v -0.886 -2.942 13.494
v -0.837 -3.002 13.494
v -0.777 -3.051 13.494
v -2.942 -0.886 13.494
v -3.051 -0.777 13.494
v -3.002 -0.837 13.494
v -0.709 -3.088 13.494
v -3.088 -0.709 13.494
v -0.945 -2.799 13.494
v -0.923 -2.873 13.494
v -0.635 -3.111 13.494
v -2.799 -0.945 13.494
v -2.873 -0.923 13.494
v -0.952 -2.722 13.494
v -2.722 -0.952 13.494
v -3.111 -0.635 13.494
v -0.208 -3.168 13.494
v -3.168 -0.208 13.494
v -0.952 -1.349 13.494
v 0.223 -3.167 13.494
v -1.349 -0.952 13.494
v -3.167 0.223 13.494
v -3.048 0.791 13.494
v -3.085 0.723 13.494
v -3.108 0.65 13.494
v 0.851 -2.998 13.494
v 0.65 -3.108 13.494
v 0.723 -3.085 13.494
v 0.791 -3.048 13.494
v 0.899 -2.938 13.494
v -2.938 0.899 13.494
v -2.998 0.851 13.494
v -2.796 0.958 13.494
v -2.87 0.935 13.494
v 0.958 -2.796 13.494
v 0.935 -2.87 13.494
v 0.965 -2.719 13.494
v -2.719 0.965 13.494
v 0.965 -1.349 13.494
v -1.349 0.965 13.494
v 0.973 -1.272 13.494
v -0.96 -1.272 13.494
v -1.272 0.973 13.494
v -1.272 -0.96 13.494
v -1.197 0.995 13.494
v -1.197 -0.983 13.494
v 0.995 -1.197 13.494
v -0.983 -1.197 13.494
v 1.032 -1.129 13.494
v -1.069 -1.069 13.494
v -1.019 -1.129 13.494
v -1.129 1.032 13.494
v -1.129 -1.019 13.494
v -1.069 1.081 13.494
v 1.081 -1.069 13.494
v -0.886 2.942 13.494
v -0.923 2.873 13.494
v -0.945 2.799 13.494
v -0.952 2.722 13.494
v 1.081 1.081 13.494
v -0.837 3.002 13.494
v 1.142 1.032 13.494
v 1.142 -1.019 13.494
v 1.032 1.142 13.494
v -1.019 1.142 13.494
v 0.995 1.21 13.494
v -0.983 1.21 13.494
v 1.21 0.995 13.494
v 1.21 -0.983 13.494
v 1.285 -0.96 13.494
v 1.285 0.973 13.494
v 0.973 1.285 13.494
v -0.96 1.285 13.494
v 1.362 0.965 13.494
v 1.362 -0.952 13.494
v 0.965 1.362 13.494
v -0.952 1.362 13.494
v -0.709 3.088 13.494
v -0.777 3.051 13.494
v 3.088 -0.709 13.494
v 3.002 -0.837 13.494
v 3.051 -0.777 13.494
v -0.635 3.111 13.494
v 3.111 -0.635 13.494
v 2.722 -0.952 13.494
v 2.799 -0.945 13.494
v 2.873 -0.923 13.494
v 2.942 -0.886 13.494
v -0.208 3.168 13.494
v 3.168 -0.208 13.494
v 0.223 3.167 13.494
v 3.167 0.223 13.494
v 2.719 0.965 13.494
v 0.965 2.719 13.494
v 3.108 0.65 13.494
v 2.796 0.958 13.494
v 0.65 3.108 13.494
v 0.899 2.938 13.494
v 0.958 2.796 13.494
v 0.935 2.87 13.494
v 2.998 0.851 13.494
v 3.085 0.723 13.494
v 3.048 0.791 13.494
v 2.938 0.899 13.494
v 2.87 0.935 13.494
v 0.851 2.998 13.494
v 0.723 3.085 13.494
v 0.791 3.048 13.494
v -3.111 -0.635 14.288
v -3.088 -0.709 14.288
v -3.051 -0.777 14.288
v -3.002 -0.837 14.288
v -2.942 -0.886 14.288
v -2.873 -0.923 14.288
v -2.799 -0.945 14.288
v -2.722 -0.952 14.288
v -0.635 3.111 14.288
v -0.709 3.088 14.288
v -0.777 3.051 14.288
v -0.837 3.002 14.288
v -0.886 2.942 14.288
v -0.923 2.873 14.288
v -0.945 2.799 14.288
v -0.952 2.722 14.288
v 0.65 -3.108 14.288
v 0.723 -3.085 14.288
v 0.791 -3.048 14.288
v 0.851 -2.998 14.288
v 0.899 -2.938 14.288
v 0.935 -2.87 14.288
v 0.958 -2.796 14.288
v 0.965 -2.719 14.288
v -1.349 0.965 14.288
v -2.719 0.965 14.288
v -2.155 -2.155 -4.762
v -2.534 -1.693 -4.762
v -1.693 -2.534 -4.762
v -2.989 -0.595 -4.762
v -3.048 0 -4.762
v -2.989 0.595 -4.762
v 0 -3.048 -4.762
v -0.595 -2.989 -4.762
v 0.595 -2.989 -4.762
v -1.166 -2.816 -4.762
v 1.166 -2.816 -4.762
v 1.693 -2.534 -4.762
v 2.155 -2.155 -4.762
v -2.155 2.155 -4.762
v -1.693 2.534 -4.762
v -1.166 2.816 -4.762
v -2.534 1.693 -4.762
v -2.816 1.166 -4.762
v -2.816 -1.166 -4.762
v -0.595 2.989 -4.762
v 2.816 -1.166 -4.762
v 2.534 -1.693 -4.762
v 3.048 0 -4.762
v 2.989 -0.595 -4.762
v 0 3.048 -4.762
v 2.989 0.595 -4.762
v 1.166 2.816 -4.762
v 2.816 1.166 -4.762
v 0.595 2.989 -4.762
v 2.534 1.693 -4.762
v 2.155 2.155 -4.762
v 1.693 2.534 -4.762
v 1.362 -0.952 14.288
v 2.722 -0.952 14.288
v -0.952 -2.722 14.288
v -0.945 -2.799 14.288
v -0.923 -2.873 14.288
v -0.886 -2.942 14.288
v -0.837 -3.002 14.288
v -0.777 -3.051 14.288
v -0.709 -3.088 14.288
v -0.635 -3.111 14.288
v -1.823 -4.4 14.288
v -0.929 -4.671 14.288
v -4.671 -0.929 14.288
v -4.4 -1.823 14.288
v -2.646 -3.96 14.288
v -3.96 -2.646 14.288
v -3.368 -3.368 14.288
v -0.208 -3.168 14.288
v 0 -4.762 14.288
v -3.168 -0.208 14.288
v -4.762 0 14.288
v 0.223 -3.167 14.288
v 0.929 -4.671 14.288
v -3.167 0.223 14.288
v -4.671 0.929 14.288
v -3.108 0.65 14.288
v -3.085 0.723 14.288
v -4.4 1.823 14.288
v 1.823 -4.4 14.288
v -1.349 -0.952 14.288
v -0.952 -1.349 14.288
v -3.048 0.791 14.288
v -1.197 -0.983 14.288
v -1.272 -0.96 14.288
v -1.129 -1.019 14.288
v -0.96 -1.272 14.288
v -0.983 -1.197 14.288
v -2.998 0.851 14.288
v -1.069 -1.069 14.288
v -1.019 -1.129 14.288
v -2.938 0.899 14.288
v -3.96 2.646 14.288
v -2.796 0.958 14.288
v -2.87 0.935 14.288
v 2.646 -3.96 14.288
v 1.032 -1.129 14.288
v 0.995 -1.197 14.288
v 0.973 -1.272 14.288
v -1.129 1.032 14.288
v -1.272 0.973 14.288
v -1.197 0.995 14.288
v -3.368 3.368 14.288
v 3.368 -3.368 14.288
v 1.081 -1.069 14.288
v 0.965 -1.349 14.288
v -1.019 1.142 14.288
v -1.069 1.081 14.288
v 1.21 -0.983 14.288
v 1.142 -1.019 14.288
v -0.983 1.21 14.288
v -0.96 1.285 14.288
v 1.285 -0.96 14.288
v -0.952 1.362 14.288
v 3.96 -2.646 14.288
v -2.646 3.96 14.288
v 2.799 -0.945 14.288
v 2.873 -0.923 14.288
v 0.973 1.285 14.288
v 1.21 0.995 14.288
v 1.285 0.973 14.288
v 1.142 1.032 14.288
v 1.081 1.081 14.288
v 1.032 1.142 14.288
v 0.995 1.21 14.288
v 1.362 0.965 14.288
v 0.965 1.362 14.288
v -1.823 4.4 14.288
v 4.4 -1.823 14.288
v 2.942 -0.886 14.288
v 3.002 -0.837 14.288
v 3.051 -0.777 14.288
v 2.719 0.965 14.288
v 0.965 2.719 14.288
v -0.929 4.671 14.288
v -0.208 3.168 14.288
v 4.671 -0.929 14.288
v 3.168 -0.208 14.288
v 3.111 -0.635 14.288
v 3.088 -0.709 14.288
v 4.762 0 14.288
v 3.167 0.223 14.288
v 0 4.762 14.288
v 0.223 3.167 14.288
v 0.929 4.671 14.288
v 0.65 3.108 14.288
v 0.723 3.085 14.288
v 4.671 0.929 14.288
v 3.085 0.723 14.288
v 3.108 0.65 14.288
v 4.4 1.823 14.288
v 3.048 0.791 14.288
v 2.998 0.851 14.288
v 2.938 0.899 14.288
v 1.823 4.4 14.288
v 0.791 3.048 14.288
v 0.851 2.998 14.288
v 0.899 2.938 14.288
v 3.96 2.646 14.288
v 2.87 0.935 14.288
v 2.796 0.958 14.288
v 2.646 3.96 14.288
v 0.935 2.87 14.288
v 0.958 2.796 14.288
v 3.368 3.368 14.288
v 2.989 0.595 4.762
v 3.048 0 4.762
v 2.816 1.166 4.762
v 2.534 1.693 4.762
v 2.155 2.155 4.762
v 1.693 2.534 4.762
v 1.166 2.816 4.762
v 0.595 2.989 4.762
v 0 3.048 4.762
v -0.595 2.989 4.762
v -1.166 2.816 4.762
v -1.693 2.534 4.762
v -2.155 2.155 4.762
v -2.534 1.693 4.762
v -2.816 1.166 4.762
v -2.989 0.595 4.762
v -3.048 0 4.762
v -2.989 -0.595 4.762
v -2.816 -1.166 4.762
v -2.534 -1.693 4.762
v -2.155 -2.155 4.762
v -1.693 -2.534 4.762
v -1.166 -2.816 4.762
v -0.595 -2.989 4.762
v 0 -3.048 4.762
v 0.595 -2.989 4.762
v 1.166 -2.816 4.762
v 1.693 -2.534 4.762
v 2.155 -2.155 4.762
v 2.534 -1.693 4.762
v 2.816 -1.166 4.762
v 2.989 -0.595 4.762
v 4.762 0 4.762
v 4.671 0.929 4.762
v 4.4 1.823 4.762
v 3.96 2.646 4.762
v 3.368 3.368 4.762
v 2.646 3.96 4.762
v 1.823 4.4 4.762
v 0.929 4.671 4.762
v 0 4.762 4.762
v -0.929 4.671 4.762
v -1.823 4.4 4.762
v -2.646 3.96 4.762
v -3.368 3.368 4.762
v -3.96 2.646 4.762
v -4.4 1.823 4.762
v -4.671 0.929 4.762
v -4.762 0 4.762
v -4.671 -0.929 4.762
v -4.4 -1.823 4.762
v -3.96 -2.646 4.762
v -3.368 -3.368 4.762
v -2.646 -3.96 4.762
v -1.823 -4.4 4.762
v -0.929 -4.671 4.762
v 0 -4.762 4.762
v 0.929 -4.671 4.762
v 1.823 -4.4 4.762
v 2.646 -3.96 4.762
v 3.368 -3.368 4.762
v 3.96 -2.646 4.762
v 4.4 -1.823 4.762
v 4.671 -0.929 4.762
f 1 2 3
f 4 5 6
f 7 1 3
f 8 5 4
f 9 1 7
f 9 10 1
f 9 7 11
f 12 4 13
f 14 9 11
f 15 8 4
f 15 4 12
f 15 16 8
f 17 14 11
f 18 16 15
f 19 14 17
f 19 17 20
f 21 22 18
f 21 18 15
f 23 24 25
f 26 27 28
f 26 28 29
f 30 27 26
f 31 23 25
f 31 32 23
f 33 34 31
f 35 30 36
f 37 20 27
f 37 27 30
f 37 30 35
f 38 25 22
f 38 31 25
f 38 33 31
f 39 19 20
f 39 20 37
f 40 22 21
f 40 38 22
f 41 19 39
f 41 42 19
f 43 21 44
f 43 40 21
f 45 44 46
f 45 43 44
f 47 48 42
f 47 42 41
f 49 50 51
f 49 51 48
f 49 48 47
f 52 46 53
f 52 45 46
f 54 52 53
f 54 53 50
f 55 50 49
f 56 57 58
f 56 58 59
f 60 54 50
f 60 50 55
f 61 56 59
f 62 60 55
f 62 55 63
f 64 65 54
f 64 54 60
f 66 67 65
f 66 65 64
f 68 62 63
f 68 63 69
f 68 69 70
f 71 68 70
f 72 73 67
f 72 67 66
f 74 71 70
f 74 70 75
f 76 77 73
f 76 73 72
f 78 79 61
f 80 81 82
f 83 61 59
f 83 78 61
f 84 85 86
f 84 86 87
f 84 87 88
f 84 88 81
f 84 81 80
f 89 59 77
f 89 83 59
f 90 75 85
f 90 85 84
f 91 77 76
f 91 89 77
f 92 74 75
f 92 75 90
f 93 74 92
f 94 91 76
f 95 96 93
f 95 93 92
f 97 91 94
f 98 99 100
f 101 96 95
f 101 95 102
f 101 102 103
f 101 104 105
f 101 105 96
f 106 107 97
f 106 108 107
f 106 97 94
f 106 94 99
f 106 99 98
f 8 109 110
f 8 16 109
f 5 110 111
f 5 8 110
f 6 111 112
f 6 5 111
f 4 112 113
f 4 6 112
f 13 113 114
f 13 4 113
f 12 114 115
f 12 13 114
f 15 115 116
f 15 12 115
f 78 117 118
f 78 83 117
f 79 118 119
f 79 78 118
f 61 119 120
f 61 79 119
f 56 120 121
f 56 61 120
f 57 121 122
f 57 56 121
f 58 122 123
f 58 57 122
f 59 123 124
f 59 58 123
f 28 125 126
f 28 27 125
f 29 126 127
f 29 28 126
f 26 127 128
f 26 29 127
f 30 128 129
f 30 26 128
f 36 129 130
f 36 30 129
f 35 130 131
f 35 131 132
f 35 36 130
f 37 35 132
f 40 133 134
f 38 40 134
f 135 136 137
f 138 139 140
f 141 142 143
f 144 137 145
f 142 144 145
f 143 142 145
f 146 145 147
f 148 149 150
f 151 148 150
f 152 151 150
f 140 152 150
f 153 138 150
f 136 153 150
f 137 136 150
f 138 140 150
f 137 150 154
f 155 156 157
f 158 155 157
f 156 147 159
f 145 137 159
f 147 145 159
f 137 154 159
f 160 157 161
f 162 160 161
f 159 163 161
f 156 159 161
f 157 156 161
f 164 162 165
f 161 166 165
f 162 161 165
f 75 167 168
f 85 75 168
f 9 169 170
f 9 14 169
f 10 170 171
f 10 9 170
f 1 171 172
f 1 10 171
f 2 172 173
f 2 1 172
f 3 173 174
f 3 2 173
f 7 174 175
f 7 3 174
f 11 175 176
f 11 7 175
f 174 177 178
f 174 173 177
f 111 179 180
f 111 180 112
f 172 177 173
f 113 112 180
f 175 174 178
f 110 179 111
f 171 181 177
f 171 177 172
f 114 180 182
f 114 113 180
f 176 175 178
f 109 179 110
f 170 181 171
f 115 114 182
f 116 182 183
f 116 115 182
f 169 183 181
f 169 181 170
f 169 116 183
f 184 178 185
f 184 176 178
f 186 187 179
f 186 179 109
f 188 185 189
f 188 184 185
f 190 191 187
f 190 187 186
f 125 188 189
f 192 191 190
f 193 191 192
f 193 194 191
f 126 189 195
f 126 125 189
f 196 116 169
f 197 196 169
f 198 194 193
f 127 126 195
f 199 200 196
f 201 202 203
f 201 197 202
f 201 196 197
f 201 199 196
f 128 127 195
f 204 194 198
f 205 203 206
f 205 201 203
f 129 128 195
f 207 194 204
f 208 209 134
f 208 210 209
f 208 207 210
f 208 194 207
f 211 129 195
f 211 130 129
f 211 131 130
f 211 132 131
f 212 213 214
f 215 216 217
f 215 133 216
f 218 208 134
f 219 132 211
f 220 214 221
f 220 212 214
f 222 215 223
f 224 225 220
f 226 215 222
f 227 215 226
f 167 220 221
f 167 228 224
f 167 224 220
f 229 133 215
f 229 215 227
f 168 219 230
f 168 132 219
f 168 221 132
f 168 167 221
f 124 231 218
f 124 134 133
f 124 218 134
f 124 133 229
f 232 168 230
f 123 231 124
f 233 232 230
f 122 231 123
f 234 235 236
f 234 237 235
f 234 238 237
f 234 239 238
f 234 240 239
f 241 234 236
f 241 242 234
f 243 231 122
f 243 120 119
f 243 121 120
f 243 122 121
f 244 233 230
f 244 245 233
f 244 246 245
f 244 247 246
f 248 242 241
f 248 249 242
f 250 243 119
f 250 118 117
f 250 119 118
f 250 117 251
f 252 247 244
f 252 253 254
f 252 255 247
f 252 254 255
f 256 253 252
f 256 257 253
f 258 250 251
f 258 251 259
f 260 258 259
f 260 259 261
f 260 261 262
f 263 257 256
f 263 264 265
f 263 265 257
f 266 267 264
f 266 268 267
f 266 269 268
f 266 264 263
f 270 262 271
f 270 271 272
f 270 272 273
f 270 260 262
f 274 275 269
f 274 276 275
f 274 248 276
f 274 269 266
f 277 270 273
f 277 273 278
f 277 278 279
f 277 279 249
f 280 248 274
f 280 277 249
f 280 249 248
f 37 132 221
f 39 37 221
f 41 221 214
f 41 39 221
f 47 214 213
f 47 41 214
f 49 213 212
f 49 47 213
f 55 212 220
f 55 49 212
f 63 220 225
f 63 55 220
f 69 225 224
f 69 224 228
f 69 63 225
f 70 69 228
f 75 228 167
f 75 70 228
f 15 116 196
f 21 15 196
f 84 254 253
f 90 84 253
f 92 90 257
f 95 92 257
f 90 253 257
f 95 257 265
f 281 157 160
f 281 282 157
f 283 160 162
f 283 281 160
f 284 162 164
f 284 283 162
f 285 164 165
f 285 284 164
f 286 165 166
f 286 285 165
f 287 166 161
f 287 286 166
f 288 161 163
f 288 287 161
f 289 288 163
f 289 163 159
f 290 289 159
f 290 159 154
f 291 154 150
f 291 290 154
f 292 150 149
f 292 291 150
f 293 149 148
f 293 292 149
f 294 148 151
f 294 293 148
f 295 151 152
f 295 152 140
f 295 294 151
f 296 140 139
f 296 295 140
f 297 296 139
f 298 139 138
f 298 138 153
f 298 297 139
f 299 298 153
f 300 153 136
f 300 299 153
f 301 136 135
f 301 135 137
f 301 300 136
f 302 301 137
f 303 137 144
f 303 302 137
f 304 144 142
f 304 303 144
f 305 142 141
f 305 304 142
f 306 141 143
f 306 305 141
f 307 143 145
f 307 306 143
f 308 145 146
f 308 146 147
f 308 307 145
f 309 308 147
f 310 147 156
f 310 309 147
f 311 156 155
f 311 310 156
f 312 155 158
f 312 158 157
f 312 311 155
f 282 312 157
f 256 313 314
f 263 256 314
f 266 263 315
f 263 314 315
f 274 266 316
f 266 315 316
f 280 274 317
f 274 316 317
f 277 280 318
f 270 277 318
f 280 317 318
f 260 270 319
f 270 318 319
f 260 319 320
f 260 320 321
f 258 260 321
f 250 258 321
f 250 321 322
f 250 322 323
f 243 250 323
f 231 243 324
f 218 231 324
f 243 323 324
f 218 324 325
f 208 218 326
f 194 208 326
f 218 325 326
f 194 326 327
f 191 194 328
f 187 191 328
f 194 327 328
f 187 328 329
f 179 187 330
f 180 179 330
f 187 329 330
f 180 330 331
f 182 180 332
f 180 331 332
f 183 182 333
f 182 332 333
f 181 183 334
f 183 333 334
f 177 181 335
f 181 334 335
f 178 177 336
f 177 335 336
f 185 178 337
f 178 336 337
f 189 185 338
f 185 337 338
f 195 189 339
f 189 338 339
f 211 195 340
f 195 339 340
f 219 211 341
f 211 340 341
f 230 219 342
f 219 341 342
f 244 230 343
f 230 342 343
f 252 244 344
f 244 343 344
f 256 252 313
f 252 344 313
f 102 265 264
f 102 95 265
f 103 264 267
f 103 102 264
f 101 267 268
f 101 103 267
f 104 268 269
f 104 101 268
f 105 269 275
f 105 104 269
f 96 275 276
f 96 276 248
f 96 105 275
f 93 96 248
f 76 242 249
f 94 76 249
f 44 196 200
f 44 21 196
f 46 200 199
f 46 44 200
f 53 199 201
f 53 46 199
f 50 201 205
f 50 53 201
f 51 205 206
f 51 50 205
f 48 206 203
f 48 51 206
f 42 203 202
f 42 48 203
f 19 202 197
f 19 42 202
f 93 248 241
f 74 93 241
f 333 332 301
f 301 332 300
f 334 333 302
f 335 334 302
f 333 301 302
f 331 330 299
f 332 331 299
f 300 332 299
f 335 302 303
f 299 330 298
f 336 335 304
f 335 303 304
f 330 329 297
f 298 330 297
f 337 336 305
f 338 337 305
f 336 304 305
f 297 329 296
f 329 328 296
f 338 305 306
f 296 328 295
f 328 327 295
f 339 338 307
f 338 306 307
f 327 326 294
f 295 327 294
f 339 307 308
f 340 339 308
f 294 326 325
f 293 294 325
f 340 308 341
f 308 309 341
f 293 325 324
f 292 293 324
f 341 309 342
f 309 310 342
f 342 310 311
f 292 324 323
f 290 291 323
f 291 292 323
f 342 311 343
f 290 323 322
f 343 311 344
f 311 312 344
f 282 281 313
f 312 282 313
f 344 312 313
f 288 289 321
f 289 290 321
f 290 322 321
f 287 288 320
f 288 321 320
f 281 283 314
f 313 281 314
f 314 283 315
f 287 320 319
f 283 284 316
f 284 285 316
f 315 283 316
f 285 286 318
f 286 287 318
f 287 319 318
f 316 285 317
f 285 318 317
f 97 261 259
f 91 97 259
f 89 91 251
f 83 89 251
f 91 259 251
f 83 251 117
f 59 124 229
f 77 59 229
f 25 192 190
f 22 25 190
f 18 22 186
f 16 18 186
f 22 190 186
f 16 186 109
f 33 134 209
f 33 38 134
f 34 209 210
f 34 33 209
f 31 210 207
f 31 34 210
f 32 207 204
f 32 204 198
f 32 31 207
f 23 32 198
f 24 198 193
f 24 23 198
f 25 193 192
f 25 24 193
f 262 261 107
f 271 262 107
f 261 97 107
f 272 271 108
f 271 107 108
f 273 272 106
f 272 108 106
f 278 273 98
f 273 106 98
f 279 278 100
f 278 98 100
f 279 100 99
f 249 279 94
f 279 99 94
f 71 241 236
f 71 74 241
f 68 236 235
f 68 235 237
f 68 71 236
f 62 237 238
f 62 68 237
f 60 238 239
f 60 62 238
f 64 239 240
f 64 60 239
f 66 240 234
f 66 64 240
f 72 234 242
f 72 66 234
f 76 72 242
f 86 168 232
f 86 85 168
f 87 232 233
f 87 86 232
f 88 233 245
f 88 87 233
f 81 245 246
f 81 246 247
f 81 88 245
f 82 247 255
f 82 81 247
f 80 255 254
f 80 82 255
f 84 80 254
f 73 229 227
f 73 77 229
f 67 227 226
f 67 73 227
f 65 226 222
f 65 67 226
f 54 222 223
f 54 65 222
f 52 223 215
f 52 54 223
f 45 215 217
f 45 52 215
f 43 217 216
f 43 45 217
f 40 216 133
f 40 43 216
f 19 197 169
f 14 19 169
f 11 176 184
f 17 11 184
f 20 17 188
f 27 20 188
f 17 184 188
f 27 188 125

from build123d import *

# Parameters (mm, degrees)
F0_R     = 3.048
F1_DEPTH = 4.7625
F2_R     = 4.7625
F3_DEPTH = 9.525
F5_DEPTH = 0.79375
F6_R     = 0.396875


with BuildPart() as f1:
    # F0 (on Top) → F1 (new body, symmetric)
    with BuildSketch(Plane.XY):
        Circle(F0_R)
    extrude(amount=F1_DEPTH, both=True)

    # F2 (on face) → F3 (join)
    with BuildSketch(Plane.XY.offset(4.7625)):
        Circle(F2_R)
    extrude(amount=F3_DEPTH)

    # F4 (on face) → F5 (cut)
    with BuildSketch(Plane.XY.offset(14.2875)):
        with BuildLine():
            ThreePointArc((0.9652, 3.0247337007), (0.0066610182, 3.1749930127), (-0.9525, 3.0287569645))
            Line((-0.9525, 3.0287569645), (-0.9525, 0.9652))
            Line((-0.9525, 0.9652), (-3.0247337007, 0.9652))
            ThreePointArc((-3.0247337007, 0.9652), (-3.1749930127, 0.0066610182), (-3.0287569645, -0.9525))
            Line((-3.0287569645, -0.9525), (-0.9525, -0.9525))
            Line((-0.9525, -0.9525), (-0.9525, -3.0287569645))
            ThreePointArc((-0.9525, -3.0287569645), (0.0066610182, -3.1749930127), (0.9652, -3.0247337007))
            Line((0.9652, -3.0247337007), (0.9652, -0.9525))
            Line((0.9652, -0.9525), (3.0287569645, -0.9525))
            ThreePointArc((3.0287569645, -0.9525), (3.1749930127, 0.0066610182), (3.0247337007, 0.9652))
            Line((3.0247337007, 0.9652), (0.9652, 0.9652))
            Line((0.9652, 0.9652), (0.9652, 3.0247337007))
        make_face()
    extrude(amount=-F5_DEPTH, mode=Mode.SUBTRACT)

    # F6
    f6_edges = [f1.edges().sort_by_distance(p)[0] for p in [
        (-0.9525, 0.9652, 13.890625),
        (0.9652, 0.9652, 13.890625),
        (0.9652, -0.9525, 13.890625),
        (-0.9525, -0.9525, 13.890625),
        (-3.028757, -0.9525, 13.890625),
        (-3.024734, 0.9652, 13.890625),
        (0.9652, -3.024734, 13.890625),
        (3.028757, -0.9525, 13.890625),
        (3.024734, 0.9652, 13.890625),
        (0.9652, 3.024734, 13.890625),
        (-0.9525, 3.028757, 13.890625),
        (-0.9525, -3.028757, 13.890625),
    ]]
    fillet(f6_edges, radius=F6_R)


solid = f1.part
